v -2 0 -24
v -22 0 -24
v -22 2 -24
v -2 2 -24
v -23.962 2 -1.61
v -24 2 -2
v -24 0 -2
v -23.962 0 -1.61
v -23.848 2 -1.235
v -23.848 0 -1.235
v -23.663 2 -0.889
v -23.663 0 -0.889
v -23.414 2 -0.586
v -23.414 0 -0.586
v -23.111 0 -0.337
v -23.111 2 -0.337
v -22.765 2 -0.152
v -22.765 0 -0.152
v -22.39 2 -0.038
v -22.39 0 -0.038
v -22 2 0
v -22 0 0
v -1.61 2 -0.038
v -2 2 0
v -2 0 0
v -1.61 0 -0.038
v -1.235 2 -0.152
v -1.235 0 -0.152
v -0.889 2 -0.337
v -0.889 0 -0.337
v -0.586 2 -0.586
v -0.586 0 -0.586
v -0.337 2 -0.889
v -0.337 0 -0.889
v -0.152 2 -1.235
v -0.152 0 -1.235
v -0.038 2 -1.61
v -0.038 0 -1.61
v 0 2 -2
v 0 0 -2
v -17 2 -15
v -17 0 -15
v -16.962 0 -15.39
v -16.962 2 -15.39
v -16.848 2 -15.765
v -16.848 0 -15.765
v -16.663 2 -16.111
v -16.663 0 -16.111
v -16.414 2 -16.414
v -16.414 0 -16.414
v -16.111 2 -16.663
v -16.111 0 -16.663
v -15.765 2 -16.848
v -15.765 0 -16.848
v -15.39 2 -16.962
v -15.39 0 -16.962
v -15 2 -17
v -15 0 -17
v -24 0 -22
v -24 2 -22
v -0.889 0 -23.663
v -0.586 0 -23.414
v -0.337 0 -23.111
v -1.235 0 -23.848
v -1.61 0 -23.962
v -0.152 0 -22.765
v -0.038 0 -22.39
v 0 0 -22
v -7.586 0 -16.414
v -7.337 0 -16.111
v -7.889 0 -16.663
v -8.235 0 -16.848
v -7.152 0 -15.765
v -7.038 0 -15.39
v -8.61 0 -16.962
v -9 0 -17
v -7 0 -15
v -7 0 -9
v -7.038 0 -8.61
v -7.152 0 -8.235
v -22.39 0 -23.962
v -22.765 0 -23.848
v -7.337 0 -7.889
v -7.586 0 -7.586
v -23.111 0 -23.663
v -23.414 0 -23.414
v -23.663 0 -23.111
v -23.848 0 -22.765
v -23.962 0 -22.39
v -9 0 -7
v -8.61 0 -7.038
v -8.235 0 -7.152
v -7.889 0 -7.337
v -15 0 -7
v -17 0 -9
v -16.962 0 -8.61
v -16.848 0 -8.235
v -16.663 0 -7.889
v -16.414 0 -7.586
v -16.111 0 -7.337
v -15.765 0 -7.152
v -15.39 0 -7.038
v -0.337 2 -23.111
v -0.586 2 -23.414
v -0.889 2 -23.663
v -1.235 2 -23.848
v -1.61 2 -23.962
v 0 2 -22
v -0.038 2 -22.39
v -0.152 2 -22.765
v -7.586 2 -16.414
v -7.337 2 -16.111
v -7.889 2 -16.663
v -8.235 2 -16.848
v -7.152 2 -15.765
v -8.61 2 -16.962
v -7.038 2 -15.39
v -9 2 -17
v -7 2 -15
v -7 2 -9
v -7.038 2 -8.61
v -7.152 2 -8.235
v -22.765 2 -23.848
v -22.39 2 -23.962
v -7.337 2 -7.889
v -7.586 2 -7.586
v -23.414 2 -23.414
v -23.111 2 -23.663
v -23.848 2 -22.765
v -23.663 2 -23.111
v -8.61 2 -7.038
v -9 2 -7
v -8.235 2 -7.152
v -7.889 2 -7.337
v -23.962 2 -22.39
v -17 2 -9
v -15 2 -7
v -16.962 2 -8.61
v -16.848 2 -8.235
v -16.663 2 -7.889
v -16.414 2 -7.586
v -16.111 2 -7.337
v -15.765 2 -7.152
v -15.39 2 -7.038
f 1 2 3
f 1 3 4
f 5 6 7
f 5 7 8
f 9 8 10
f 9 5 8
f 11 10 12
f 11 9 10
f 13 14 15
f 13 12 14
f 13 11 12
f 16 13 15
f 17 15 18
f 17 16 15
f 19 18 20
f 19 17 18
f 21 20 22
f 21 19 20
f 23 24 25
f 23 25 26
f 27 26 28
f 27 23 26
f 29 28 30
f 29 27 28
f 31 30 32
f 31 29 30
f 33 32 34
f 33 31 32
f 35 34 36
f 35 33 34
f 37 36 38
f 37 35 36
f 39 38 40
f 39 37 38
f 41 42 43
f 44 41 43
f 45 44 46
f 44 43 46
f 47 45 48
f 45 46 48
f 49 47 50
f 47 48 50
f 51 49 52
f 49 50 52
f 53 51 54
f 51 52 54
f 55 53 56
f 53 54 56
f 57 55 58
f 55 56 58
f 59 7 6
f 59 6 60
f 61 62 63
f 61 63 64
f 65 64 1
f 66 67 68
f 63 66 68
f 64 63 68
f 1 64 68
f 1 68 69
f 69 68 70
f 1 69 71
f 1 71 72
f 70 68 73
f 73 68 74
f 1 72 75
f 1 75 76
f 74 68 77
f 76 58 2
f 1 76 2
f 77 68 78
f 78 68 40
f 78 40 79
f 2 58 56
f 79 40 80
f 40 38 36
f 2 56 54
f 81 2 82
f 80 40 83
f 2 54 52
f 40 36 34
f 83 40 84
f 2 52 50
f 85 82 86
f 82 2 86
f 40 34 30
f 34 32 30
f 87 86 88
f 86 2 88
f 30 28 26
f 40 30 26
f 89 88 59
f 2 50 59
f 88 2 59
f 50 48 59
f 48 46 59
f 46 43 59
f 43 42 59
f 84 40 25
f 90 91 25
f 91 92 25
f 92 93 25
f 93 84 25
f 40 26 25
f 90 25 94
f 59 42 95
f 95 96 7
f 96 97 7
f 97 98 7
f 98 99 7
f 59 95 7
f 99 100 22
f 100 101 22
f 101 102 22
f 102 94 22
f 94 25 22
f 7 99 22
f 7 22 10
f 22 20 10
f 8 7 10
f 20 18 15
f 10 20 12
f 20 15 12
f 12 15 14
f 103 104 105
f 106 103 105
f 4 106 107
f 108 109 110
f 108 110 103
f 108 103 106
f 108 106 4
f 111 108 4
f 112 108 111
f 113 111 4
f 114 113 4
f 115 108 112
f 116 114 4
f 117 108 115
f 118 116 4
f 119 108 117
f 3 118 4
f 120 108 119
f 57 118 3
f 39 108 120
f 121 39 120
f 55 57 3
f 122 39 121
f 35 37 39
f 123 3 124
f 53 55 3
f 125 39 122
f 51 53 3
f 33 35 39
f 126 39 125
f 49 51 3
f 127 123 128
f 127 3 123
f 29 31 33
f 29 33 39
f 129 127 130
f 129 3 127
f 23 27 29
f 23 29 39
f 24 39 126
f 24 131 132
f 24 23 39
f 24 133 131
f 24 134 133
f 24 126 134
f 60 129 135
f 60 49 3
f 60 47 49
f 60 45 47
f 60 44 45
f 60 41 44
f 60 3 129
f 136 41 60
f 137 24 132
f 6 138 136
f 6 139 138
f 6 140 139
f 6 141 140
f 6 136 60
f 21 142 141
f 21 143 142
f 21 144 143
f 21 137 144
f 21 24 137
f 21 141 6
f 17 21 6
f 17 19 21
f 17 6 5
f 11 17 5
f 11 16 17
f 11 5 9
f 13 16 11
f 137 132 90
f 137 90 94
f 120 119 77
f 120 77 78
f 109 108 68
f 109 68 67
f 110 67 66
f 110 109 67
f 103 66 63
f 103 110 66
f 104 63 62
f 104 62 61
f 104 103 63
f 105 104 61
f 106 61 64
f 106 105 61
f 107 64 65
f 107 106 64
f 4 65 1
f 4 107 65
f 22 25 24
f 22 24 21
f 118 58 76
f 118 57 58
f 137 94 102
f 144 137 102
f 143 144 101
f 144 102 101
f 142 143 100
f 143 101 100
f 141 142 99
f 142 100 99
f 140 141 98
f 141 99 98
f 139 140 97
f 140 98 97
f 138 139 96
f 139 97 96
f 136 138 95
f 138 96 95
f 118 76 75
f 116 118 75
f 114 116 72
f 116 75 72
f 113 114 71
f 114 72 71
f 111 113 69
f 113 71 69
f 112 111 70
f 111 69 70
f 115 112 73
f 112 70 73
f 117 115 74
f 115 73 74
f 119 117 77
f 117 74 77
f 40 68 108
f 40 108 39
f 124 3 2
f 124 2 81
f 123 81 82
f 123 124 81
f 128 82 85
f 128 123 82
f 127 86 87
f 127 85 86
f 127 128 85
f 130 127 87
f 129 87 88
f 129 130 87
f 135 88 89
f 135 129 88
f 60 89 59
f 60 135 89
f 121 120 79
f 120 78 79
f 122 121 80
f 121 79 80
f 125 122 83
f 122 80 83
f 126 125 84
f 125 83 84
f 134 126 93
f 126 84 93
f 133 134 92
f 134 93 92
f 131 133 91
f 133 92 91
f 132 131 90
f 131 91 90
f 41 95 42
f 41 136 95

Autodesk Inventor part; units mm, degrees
ref_plane "YZ Plane" through (0, 0, 0) normal (1, 0, 0) x (0, 1, 0)
ref_plane "XZ Plane" through (0, 0, 0) normal (0, 1, 0) x (-1, 0, 0)
ref_plane "XY Plane" through (0, 0, 0) normal (0, 0, 1) x (1, 0, 0)
sketch "Sketch1" plane through (0, 0, 0) normal (0, 1, 0) x (-1, 0, 0)
  line L0 (0, 0) -> (24, 0)
  line L1 (24, 0) -> (24, -24)
  line L2 (24, -24) -> (0, -24)
  line L3 (0, -24) -> (0, 0)
  dimension "d0" = 24
  dimension "d1" = 24
extrude "Extrusion1" add sketch "Sketch1" along normal blind 2
sketch "Sketch2" plane through (0, 2, 0) normal (0, 1, 0) x (1, 0, 0)
  line L0 (0, 24) -> (-24, 24) projected
  line L1 (-24, 0) -> (0, 0) projected
  line L2 (-24, 24) -> (0, 0)
  line L3 (0, 24) -> (-24, 0)
  line L4 (-17, 17) -> (-7, 17)
  line L5 (-7, 17) -> (-7, 7)
  line L6 (-7, 7) -> (-17, 7)
  line L7 (-17, 7) -> (-17, 17)
  line L8 (-17, 17) -> (-7, 7) construction
  line L9 (-7, 17) -> (-17, 7) construction
  point P0 (-12, 12)
  point P1 (-12, 12)
  dimension "d4" = 10
extrude "Extrusion2" cut sketch "Sketch2" against normal through all contours L5 L2 L3 | L3 L2 L4 | L2 L3 L7 | L2 L6 L3
fillet "Fillet1" radius 2 8 edges at (0, 1, 0) (0, 1, -24) (-24, 1, 0) (-24, 1, -24) (-7, 1, -17) (-17, 1, -17) (-17, 1, -7) (-7, 1, -7)
properties part number "hot_glue_mashroom"
